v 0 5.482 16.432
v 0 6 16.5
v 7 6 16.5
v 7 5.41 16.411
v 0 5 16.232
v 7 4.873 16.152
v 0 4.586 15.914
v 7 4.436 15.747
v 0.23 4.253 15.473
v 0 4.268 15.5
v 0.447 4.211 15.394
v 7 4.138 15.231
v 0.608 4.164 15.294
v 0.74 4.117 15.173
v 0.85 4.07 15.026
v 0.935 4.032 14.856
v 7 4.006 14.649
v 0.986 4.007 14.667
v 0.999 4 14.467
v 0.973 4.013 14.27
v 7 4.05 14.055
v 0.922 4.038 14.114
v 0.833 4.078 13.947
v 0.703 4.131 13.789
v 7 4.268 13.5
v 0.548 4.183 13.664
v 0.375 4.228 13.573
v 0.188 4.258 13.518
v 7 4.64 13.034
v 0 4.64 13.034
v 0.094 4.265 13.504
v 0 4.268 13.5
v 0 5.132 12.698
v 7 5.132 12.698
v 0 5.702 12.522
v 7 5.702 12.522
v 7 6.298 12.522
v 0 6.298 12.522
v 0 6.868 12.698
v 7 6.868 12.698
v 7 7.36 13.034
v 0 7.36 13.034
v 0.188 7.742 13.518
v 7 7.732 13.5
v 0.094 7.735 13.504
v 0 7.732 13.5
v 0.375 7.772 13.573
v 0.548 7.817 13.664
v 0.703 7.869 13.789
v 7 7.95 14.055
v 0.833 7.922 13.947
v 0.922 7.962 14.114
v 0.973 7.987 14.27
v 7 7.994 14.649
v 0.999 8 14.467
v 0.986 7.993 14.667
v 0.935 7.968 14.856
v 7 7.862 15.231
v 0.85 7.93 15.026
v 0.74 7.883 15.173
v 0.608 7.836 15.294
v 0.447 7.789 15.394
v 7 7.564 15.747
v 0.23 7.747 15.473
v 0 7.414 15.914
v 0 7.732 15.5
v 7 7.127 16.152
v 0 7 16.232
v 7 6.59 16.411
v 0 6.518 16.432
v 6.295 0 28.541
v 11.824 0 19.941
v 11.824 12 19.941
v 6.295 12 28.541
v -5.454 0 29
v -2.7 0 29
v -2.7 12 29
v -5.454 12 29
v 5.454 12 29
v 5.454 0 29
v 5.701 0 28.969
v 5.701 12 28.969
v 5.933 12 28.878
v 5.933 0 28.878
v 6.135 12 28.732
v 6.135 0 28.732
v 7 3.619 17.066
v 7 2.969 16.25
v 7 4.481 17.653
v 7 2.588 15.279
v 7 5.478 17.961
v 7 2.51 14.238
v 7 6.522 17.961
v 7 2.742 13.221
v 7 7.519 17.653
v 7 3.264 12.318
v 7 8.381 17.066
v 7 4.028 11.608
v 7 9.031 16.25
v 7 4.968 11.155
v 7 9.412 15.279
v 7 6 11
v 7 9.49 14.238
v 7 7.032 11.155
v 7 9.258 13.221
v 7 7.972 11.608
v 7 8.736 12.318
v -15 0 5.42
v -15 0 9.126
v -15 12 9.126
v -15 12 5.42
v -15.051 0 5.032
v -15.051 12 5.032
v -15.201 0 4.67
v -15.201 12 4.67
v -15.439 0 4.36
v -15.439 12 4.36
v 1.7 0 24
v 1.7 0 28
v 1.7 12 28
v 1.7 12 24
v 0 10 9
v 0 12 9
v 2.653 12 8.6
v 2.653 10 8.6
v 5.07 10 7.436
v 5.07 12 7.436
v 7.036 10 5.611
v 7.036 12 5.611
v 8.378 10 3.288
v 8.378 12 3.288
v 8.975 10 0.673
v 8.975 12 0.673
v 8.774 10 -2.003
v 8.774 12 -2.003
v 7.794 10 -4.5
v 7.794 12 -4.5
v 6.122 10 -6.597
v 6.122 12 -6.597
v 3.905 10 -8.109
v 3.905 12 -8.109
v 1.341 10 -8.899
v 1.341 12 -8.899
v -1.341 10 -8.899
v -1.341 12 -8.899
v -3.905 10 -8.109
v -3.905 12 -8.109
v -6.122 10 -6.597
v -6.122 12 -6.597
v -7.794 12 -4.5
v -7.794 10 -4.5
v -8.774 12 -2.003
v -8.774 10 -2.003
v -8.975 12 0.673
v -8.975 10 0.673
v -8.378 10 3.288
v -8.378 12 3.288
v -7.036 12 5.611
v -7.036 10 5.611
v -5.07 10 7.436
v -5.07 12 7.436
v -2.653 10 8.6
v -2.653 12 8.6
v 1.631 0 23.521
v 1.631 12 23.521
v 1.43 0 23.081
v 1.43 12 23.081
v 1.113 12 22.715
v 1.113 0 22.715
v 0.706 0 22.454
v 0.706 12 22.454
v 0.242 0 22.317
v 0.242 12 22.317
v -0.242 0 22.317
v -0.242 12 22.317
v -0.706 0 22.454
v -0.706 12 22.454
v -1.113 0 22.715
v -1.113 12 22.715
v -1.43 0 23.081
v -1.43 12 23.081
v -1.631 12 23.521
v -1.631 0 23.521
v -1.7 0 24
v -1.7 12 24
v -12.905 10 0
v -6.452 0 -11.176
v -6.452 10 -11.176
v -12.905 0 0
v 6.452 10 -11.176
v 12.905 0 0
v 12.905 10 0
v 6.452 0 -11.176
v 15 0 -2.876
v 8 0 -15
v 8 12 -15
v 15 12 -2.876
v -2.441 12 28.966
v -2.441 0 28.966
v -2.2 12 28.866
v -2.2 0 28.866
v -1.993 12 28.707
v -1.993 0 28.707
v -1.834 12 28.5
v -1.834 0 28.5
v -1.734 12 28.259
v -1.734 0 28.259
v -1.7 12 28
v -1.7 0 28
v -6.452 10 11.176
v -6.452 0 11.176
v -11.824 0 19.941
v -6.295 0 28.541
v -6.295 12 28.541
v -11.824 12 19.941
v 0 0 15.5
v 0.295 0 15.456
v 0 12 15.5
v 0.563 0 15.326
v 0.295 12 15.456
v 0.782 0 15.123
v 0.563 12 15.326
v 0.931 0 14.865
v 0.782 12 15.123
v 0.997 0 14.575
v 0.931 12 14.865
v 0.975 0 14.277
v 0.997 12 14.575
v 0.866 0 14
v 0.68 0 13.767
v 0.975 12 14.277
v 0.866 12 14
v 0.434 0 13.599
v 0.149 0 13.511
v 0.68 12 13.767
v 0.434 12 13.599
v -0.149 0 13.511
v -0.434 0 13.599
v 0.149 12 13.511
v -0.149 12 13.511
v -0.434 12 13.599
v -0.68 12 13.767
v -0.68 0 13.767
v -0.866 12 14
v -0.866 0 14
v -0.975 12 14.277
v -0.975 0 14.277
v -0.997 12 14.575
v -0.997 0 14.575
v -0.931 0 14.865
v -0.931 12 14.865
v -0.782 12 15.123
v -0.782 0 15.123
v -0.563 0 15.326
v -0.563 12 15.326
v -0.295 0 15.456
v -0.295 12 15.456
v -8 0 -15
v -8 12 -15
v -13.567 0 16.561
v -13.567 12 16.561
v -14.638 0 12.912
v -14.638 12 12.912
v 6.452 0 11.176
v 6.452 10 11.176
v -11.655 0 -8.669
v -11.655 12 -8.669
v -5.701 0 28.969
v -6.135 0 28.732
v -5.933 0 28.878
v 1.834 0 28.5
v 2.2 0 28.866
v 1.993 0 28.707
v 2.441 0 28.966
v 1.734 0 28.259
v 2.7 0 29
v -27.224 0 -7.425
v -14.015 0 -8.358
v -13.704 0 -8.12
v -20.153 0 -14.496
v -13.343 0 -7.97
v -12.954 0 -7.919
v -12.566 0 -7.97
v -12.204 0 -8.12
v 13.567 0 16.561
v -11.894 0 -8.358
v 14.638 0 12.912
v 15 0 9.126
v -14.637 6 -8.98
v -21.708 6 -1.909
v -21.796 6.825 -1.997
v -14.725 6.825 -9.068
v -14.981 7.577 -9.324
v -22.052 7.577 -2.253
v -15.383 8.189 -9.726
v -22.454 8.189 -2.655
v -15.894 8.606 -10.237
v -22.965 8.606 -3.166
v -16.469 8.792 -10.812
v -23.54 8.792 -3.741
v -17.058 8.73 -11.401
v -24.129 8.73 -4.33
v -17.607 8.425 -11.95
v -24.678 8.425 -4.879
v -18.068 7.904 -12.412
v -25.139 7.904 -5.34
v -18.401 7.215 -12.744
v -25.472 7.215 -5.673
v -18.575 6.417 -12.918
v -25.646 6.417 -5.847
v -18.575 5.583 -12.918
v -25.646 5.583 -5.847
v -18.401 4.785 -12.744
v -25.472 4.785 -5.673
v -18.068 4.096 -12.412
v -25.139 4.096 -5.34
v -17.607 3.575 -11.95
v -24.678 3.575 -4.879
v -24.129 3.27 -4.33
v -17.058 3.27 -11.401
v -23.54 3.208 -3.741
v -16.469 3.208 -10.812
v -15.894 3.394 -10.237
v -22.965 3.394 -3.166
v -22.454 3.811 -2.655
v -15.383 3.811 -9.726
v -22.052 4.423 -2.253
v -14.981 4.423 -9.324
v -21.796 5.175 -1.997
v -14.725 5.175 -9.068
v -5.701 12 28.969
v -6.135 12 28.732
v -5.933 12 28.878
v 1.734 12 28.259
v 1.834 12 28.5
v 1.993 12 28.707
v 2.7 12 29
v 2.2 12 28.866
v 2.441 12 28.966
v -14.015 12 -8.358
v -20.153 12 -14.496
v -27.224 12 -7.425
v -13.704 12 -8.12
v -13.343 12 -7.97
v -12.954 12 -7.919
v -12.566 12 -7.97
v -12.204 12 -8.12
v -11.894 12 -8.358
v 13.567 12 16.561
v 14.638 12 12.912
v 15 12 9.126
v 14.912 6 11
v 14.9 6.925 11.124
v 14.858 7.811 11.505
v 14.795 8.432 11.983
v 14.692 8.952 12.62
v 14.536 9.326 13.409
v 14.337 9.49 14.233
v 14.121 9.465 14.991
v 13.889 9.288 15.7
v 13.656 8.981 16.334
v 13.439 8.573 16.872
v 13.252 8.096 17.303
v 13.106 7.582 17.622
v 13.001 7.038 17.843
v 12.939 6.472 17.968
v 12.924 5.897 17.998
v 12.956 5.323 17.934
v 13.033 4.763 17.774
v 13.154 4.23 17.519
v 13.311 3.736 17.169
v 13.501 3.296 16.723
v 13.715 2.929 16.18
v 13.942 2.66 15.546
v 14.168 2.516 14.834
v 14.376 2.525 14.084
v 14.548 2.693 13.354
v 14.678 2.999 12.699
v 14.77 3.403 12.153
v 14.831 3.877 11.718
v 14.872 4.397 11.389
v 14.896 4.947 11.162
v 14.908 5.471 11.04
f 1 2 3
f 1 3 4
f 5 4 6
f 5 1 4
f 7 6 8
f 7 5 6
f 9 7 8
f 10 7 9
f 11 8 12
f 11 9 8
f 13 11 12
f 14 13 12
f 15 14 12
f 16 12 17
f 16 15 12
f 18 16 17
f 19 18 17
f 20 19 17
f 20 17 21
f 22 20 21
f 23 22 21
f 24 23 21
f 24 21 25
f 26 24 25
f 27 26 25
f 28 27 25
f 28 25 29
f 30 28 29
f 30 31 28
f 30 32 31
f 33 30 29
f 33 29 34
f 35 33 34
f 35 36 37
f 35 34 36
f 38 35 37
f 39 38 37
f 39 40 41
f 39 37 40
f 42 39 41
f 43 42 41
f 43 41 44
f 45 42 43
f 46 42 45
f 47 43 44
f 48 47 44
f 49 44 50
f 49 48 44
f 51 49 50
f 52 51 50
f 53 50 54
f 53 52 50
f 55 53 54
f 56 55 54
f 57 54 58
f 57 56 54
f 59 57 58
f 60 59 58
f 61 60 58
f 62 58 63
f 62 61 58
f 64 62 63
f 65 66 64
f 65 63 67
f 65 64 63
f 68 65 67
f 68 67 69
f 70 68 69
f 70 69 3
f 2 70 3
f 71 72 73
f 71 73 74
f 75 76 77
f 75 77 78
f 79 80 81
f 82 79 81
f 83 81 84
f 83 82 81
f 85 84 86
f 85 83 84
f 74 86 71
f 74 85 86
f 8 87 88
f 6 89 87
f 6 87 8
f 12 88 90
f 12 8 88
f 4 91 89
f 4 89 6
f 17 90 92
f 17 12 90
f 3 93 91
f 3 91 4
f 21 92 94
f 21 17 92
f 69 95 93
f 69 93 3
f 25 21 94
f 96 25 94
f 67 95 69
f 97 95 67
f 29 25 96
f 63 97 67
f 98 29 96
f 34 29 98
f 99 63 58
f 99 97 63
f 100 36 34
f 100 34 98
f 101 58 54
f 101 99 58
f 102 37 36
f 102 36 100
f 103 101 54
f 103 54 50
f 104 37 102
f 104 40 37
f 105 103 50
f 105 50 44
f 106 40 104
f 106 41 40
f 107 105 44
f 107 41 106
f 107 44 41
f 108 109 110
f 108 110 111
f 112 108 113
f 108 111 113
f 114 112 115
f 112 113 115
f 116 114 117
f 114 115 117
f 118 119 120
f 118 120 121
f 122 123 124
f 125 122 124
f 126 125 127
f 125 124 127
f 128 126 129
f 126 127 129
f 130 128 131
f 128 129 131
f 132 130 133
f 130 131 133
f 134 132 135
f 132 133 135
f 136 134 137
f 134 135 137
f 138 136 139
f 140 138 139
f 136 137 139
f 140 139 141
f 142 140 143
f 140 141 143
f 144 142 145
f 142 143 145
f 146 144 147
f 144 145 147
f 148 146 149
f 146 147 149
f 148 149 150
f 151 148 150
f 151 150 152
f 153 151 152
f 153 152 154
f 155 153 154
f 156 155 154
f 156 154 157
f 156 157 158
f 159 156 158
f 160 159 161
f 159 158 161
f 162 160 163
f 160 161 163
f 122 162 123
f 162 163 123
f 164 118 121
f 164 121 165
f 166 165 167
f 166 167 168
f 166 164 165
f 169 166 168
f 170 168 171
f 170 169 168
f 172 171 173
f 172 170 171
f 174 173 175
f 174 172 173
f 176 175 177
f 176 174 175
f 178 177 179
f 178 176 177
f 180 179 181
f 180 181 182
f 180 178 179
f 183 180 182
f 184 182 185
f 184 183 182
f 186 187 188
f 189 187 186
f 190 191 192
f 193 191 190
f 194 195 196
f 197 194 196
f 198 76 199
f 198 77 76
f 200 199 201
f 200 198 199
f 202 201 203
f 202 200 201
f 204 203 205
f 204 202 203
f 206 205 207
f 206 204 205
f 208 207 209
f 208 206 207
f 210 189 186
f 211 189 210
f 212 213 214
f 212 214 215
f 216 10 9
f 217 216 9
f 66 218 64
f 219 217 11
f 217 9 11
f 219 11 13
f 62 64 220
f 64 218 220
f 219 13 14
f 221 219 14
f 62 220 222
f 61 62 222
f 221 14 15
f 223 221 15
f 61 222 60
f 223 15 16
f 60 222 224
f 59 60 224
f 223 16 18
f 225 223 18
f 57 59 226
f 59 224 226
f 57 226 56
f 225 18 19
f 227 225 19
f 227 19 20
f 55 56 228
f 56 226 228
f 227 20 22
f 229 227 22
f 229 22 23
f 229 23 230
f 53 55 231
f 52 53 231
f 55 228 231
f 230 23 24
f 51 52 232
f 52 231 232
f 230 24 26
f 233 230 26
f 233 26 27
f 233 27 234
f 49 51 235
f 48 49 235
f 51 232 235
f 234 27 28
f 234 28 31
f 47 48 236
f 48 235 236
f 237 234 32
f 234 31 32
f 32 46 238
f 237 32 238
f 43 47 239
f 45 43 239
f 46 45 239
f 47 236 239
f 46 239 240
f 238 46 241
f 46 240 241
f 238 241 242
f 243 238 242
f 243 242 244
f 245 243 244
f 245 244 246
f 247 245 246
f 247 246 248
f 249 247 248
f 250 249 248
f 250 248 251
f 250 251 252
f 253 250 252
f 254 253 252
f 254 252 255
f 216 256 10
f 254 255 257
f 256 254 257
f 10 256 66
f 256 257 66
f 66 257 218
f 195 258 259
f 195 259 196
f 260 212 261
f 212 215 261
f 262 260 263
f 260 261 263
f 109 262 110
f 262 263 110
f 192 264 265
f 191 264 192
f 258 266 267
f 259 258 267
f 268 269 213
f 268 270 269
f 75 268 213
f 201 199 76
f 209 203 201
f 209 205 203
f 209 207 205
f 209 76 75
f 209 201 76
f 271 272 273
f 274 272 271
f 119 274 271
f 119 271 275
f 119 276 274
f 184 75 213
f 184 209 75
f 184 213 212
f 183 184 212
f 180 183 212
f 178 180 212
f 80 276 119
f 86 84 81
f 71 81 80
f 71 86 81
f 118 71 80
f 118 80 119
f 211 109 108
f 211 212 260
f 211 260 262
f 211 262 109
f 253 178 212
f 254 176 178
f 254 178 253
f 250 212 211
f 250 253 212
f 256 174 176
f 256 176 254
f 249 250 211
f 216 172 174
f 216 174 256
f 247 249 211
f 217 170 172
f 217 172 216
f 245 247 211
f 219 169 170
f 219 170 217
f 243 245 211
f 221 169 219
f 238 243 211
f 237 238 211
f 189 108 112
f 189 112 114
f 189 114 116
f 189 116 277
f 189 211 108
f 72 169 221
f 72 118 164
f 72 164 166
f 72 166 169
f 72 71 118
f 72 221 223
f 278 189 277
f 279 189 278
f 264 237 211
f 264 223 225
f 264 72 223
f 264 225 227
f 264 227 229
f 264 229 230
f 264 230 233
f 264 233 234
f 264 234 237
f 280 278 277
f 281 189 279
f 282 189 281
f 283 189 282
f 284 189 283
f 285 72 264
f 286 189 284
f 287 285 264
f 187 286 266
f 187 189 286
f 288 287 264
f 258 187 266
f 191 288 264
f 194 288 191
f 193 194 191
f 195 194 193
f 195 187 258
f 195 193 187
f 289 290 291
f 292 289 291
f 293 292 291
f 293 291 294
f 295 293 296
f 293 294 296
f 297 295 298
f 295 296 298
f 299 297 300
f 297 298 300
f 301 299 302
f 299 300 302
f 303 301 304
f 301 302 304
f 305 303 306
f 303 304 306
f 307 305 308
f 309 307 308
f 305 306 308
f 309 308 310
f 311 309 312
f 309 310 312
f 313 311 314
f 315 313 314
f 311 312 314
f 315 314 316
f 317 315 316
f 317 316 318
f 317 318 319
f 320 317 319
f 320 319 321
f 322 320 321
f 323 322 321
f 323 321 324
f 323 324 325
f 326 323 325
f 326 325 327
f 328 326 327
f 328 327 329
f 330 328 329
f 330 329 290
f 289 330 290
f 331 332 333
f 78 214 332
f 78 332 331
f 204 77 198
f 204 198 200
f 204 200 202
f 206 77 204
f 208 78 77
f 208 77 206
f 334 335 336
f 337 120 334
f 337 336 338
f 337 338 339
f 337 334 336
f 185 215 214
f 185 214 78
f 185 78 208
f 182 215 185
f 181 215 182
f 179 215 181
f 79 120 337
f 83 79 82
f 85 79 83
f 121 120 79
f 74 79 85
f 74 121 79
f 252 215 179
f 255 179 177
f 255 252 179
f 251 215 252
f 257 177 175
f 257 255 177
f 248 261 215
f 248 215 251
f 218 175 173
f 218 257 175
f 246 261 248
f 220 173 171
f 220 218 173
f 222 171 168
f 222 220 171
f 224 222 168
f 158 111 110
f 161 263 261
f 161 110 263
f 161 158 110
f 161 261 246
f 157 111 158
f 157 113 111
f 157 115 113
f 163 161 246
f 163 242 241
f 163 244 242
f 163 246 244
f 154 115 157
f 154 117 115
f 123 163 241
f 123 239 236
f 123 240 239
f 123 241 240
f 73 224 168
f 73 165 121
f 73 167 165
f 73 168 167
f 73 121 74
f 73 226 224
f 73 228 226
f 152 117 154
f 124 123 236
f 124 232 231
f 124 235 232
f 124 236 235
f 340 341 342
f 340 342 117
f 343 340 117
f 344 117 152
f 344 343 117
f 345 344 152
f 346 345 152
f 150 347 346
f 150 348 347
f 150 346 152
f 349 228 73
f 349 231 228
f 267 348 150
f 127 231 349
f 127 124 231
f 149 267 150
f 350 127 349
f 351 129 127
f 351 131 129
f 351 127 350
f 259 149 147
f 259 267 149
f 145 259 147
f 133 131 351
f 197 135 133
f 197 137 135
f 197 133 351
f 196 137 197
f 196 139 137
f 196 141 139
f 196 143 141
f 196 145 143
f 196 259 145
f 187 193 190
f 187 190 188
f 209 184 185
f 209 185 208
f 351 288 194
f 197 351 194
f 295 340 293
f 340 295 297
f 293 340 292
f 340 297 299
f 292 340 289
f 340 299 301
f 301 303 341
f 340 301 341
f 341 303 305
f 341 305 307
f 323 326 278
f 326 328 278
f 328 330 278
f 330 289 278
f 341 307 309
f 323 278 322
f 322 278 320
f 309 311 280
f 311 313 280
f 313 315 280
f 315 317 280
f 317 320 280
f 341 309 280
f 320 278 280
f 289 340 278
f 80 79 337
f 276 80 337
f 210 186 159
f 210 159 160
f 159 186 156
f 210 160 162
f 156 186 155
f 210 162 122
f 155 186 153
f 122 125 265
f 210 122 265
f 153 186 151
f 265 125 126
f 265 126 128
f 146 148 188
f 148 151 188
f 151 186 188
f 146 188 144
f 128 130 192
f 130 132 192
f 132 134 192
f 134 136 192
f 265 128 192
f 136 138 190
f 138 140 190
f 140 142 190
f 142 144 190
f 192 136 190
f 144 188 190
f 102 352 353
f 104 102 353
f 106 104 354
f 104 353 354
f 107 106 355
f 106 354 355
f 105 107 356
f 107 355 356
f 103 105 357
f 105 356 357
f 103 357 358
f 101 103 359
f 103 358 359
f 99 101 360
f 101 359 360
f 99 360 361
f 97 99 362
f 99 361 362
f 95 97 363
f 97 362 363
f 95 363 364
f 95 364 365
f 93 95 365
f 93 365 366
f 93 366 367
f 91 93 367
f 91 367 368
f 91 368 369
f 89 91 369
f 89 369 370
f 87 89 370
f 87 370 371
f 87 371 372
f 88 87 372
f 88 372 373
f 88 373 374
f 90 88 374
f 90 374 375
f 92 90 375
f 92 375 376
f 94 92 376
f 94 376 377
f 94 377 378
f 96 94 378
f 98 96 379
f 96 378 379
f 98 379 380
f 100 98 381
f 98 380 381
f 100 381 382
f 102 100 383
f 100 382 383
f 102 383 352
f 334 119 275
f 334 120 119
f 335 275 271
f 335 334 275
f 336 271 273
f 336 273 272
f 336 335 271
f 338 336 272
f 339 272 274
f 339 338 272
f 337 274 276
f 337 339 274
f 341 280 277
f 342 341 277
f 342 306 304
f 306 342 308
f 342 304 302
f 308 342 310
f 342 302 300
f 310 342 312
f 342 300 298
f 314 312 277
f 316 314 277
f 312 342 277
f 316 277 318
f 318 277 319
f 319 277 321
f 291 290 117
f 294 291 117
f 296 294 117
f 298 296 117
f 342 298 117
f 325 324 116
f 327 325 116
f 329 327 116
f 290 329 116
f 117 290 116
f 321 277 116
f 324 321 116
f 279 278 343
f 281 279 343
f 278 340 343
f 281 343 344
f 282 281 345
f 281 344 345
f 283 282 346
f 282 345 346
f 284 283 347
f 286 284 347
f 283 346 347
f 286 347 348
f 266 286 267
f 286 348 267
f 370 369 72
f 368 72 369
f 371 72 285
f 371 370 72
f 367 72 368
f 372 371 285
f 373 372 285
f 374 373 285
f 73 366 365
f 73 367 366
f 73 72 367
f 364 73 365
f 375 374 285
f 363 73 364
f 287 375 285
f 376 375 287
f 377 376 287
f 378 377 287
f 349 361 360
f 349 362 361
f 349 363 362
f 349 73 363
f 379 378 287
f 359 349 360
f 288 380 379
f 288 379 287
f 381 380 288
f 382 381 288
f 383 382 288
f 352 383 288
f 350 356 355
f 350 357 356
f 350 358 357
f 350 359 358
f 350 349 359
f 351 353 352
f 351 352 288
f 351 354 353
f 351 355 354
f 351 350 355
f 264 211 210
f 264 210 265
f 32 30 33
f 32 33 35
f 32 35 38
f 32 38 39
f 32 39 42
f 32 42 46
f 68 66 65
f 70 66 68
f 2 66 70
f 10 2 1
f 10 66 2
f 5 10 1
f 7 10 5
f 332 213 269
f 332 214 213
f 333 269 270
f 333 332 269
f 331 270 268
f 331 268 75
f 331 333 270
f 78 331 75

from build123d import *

# Parameters (mm, degrees)
SKETCH1_W           = 30
SKETCH1_H           = 30
BOSS_EXTRUDE1_DEPTH = 12
BOSS_EXTRUDE6_DEPTH = 12
CHAMFER1_SIZE       = 7
CHAMFER1_SIZE2      = 12.124355653
BOSS_EXTRUDE4_DEPTH = 12
SKETCH7_R           = 2.8
CUT_EXTRUDE2_DEPTH  = 15
CHAMFER2_SIZE       = 9
CHAMFER2_SIZE_2     = 14
CHAMFER3_SIZE       = 14
CHAMFER3_SIZE_2     = 9
FILLET2_R           = 20
FILLET3_R           = 1
FILLET4_R           = 1.5
SKETCH10_R          = 1
CUT_EXTRUDE3_DEPTH  = 42.546660516
SKETCH11_R          = 2
CUT_EXTRUDE4_DEPTH  = 42.546660516
SKETCH12_R          = 9
BOSS_EXTRUDE8_DEPTH = 2
SKETCH13_R          = 3.5
CUT_EXTRUDE5_DEPTH  = 8


with BuildPart() as part:
    # Sketch1 → Boss-Extrude1 (new body)
    with BuildSketch(Plane(origin=(0, 0, 0), x_dir=(1, 0, 0), z_dir=(0, 1, 0))):
        Rectangle(SKETCH1_W, SKETCH1_H)
        Polygon((6.452466608, -11.176), (12.904933217, 0), (6.452466608, 11.176), (-6.452466608, 11.176), (-12.904933217, 0), (-6.452466608, -11.176), align=None, mode=Mode.SUBTRACT)
    extrude(amount=BOSS_EXTRUDE1_DEPTH)

    # Sketch8 → Boss-Extrude6 (add)
    with BuildSketch(Plane(origin=(0, 0, 0), x_dir=(1, 0, 0), z_dir=(0, 1, 0))):
        with BuildLine():
            Line((-6, -15), (6, -15))
            Line((6, -15), (6, -29))
            Line((6, -29), (1.7, -29))
            Line((1.7, -29), (1.7, -24))
            ThreePointArc((1.7, -24), (0, -22.3), (-1.7, -24))
            Line((-1.7, -24), (-1.7, -29))
            Line((-1.7, -29), (-6, -29))
            Line((-6, -29), (-6, -15))
        make_face()
    extrude(amount=BOSS_EXTRUDE6_DEPTH)

    # Chamfer1
    chamfer1_edges = [part.edges().sort_by_distance(p)[0] for p in [
        (-15, 6, -15),
        (15, 6, -15),
    ]]
    chamfer1_side = [part.faces().sort_by_distance(p)[0] for p in [
        (0, 6, -15),
    ]]
    chamfer(chamfer1_edges, length=CHAMFER1_SIZE, length2=CHAMFER1_SIZE2, reference=chamfer1_side[0])

    # Sketch6 → Boss-Extrude4 (add)
    with BuildSketch(Plane(origin=(0, 0, 0), x_dir=(1, 0, 0), z_dir=(0, 1, 0))):
        Polygon((-27.223611076, 7.424621202), (-15, -4.798989873), (-15, 2.875644347), (-12.632730187, 6.975875938), (-20.152543264, 14.495689014), align=None)
    extrude(amount=BOSS_EXTRUDE4_DEPTH)

    # Sketch7 → Cut-Extrude2 (cut)
    with BuildSketch(Plane(origin=(-9.899494937, 0, 9.899494937), x_dir=(0.7071067811865438, 0, 0.7071067811865512), z_dir=(-0.7071067811865512, 0, 0.7071067811865438))):
        with Locations((-19.5, 6)):
            Circle(SKETCH7_R)
    extrude(amount=-CUT_EXTRUDE2_DEPTH, mode=Mode.SUBTRACT)

    # Chamfer2
    # the kernel refuses this chamfer: 14, 9 mm, written as the material it adds along each edge
    with BuildSketch(Plane(origin=(6, 0, 15), x_dir=(0.9987204462012896, 0, -0.05057143798130468), z_dir=(0, 1, 0))) as chamfer2_piece_1:
        Polygon((CHAMFER2_SIZE * 0.998720446201, -CHAMFER2_SIZE * 0.0505714379813), (-CHAMFER2_SIZE_2 * 0.0505714379813, -CHAMFER2_SIZE_2 * 0.998720446201), (0, 0), align=None)
    extrude(amount=12)

    # Chamfer3
    # the kernel refuses this chamfer: 14, 9 mm, written as the material it adds along each edge
    with BuildSketch(Plane(origin=(-6, 0, 15), x_dir=(0.020921616646829202, 0, 0.9997811190240007), z_dir=(0, 1, 0))) as chamfer3_piece_1:
        Polygon((CHAMFER3_SIZE * 0.999781119024, -CHAMFER3_SIZE * 0.0209216166468), (-CHAMFER3_SIZE_2 * 0.0209216166468, -CHAMFER3_SIZE_2 * 0.999781119024), (0, 0), align=None)
    extrude(amount=12)

    # Fillet2
    fillet2_edges = [part.edges().sort_by_distance(p)[0] for p in [
        (15, 6, 15),
        (-15, 6, 15),
    ]]
    fillet(fillet2_edges, radius=FILLET2_R)

    # Fillet3
    fillet3_edges = [part.edges().sort_by_distance(p)[0] for p in [
        (-6, 6, 29),
        (-1.7, 6, 29),
        (1.7, 6, 29),
        (6, 6, 29),
    ]]
    fillet(fillet3_edges, radius=FILLET3_R)

    # Fillet4
    fillet4_edges = [part.edges().sort_by_distance(p)[0] for p in [
        (-15, 6, 4.798989873),
        (-12.632730187, 6, -6.975875938),
    ]]
    fillet(fillet4_edges, radius=FILLET4_R)

    # Sketch10 → Cut-Extrude3 (cut, through all)
    with BuildSketch(Plane(origin=(0, 12, 0), x_dir=(1, 0, 0), z_dir=(0, 1, 0))):
        with Locations(Location((0, -14.5, 0), (0, 0, 270))):
            Circle(SKETCH10_R)
    extrude(amount=-CUT_EXTRUDE3_DEPTH, mode=Mode.SUBTRACT)

    # Sketch11 → Cut-Extrude4 (cut, through all)
    with BuildSketch(Plane(origin=(0, 0, 0), x_dir=(0, 0, -1), z_dir=(1, 0, 0))):
        with Locations(Location((-14.5, 6, 0), (0, 0, 180))):
            Circle(SKETCH11_R)
    extrude(amount=CUT_EXTRUDE4_DEPTH, mode=Mode.SUBTRACT)

    # Sketch12 → Boss-Extrude8 (add)
    with BuildSketch(Plane(origin=(0, 12, 0), x_dir=(1, 0, 0), z_dir=(0, 1, 0))):
        Polygon((6.452466608, 11.176), (-6.452466608, 11.176), (-12.904933217, 0), (-6.452466608, -11.176), (6.452466608, -11.176), (12.904933217, 0), align=None)
        with Locations(Location((0, 0, 0), (0, 0, 270))):
            Circle(SKETCH12_R, mode=Mode.SUBTRACT)
    extrude(amount=-BOSS_EXTRUDE8_DEPTH)

    # Sketch13 → Cut-Extrude5 (cut)
    with BuildSketch(Plane(origin=(15, 0, 0), x_dir=(0, 0, -1), z_dir=(1, 0, 0))):
        with Locations((-14.5, 6)):
            Circle(SKETCH13_R)
    extrude(amount=-CUT_EXTRUDE5_DEPTH, mode=Mode.SUBTRACT)


solid = part.part
